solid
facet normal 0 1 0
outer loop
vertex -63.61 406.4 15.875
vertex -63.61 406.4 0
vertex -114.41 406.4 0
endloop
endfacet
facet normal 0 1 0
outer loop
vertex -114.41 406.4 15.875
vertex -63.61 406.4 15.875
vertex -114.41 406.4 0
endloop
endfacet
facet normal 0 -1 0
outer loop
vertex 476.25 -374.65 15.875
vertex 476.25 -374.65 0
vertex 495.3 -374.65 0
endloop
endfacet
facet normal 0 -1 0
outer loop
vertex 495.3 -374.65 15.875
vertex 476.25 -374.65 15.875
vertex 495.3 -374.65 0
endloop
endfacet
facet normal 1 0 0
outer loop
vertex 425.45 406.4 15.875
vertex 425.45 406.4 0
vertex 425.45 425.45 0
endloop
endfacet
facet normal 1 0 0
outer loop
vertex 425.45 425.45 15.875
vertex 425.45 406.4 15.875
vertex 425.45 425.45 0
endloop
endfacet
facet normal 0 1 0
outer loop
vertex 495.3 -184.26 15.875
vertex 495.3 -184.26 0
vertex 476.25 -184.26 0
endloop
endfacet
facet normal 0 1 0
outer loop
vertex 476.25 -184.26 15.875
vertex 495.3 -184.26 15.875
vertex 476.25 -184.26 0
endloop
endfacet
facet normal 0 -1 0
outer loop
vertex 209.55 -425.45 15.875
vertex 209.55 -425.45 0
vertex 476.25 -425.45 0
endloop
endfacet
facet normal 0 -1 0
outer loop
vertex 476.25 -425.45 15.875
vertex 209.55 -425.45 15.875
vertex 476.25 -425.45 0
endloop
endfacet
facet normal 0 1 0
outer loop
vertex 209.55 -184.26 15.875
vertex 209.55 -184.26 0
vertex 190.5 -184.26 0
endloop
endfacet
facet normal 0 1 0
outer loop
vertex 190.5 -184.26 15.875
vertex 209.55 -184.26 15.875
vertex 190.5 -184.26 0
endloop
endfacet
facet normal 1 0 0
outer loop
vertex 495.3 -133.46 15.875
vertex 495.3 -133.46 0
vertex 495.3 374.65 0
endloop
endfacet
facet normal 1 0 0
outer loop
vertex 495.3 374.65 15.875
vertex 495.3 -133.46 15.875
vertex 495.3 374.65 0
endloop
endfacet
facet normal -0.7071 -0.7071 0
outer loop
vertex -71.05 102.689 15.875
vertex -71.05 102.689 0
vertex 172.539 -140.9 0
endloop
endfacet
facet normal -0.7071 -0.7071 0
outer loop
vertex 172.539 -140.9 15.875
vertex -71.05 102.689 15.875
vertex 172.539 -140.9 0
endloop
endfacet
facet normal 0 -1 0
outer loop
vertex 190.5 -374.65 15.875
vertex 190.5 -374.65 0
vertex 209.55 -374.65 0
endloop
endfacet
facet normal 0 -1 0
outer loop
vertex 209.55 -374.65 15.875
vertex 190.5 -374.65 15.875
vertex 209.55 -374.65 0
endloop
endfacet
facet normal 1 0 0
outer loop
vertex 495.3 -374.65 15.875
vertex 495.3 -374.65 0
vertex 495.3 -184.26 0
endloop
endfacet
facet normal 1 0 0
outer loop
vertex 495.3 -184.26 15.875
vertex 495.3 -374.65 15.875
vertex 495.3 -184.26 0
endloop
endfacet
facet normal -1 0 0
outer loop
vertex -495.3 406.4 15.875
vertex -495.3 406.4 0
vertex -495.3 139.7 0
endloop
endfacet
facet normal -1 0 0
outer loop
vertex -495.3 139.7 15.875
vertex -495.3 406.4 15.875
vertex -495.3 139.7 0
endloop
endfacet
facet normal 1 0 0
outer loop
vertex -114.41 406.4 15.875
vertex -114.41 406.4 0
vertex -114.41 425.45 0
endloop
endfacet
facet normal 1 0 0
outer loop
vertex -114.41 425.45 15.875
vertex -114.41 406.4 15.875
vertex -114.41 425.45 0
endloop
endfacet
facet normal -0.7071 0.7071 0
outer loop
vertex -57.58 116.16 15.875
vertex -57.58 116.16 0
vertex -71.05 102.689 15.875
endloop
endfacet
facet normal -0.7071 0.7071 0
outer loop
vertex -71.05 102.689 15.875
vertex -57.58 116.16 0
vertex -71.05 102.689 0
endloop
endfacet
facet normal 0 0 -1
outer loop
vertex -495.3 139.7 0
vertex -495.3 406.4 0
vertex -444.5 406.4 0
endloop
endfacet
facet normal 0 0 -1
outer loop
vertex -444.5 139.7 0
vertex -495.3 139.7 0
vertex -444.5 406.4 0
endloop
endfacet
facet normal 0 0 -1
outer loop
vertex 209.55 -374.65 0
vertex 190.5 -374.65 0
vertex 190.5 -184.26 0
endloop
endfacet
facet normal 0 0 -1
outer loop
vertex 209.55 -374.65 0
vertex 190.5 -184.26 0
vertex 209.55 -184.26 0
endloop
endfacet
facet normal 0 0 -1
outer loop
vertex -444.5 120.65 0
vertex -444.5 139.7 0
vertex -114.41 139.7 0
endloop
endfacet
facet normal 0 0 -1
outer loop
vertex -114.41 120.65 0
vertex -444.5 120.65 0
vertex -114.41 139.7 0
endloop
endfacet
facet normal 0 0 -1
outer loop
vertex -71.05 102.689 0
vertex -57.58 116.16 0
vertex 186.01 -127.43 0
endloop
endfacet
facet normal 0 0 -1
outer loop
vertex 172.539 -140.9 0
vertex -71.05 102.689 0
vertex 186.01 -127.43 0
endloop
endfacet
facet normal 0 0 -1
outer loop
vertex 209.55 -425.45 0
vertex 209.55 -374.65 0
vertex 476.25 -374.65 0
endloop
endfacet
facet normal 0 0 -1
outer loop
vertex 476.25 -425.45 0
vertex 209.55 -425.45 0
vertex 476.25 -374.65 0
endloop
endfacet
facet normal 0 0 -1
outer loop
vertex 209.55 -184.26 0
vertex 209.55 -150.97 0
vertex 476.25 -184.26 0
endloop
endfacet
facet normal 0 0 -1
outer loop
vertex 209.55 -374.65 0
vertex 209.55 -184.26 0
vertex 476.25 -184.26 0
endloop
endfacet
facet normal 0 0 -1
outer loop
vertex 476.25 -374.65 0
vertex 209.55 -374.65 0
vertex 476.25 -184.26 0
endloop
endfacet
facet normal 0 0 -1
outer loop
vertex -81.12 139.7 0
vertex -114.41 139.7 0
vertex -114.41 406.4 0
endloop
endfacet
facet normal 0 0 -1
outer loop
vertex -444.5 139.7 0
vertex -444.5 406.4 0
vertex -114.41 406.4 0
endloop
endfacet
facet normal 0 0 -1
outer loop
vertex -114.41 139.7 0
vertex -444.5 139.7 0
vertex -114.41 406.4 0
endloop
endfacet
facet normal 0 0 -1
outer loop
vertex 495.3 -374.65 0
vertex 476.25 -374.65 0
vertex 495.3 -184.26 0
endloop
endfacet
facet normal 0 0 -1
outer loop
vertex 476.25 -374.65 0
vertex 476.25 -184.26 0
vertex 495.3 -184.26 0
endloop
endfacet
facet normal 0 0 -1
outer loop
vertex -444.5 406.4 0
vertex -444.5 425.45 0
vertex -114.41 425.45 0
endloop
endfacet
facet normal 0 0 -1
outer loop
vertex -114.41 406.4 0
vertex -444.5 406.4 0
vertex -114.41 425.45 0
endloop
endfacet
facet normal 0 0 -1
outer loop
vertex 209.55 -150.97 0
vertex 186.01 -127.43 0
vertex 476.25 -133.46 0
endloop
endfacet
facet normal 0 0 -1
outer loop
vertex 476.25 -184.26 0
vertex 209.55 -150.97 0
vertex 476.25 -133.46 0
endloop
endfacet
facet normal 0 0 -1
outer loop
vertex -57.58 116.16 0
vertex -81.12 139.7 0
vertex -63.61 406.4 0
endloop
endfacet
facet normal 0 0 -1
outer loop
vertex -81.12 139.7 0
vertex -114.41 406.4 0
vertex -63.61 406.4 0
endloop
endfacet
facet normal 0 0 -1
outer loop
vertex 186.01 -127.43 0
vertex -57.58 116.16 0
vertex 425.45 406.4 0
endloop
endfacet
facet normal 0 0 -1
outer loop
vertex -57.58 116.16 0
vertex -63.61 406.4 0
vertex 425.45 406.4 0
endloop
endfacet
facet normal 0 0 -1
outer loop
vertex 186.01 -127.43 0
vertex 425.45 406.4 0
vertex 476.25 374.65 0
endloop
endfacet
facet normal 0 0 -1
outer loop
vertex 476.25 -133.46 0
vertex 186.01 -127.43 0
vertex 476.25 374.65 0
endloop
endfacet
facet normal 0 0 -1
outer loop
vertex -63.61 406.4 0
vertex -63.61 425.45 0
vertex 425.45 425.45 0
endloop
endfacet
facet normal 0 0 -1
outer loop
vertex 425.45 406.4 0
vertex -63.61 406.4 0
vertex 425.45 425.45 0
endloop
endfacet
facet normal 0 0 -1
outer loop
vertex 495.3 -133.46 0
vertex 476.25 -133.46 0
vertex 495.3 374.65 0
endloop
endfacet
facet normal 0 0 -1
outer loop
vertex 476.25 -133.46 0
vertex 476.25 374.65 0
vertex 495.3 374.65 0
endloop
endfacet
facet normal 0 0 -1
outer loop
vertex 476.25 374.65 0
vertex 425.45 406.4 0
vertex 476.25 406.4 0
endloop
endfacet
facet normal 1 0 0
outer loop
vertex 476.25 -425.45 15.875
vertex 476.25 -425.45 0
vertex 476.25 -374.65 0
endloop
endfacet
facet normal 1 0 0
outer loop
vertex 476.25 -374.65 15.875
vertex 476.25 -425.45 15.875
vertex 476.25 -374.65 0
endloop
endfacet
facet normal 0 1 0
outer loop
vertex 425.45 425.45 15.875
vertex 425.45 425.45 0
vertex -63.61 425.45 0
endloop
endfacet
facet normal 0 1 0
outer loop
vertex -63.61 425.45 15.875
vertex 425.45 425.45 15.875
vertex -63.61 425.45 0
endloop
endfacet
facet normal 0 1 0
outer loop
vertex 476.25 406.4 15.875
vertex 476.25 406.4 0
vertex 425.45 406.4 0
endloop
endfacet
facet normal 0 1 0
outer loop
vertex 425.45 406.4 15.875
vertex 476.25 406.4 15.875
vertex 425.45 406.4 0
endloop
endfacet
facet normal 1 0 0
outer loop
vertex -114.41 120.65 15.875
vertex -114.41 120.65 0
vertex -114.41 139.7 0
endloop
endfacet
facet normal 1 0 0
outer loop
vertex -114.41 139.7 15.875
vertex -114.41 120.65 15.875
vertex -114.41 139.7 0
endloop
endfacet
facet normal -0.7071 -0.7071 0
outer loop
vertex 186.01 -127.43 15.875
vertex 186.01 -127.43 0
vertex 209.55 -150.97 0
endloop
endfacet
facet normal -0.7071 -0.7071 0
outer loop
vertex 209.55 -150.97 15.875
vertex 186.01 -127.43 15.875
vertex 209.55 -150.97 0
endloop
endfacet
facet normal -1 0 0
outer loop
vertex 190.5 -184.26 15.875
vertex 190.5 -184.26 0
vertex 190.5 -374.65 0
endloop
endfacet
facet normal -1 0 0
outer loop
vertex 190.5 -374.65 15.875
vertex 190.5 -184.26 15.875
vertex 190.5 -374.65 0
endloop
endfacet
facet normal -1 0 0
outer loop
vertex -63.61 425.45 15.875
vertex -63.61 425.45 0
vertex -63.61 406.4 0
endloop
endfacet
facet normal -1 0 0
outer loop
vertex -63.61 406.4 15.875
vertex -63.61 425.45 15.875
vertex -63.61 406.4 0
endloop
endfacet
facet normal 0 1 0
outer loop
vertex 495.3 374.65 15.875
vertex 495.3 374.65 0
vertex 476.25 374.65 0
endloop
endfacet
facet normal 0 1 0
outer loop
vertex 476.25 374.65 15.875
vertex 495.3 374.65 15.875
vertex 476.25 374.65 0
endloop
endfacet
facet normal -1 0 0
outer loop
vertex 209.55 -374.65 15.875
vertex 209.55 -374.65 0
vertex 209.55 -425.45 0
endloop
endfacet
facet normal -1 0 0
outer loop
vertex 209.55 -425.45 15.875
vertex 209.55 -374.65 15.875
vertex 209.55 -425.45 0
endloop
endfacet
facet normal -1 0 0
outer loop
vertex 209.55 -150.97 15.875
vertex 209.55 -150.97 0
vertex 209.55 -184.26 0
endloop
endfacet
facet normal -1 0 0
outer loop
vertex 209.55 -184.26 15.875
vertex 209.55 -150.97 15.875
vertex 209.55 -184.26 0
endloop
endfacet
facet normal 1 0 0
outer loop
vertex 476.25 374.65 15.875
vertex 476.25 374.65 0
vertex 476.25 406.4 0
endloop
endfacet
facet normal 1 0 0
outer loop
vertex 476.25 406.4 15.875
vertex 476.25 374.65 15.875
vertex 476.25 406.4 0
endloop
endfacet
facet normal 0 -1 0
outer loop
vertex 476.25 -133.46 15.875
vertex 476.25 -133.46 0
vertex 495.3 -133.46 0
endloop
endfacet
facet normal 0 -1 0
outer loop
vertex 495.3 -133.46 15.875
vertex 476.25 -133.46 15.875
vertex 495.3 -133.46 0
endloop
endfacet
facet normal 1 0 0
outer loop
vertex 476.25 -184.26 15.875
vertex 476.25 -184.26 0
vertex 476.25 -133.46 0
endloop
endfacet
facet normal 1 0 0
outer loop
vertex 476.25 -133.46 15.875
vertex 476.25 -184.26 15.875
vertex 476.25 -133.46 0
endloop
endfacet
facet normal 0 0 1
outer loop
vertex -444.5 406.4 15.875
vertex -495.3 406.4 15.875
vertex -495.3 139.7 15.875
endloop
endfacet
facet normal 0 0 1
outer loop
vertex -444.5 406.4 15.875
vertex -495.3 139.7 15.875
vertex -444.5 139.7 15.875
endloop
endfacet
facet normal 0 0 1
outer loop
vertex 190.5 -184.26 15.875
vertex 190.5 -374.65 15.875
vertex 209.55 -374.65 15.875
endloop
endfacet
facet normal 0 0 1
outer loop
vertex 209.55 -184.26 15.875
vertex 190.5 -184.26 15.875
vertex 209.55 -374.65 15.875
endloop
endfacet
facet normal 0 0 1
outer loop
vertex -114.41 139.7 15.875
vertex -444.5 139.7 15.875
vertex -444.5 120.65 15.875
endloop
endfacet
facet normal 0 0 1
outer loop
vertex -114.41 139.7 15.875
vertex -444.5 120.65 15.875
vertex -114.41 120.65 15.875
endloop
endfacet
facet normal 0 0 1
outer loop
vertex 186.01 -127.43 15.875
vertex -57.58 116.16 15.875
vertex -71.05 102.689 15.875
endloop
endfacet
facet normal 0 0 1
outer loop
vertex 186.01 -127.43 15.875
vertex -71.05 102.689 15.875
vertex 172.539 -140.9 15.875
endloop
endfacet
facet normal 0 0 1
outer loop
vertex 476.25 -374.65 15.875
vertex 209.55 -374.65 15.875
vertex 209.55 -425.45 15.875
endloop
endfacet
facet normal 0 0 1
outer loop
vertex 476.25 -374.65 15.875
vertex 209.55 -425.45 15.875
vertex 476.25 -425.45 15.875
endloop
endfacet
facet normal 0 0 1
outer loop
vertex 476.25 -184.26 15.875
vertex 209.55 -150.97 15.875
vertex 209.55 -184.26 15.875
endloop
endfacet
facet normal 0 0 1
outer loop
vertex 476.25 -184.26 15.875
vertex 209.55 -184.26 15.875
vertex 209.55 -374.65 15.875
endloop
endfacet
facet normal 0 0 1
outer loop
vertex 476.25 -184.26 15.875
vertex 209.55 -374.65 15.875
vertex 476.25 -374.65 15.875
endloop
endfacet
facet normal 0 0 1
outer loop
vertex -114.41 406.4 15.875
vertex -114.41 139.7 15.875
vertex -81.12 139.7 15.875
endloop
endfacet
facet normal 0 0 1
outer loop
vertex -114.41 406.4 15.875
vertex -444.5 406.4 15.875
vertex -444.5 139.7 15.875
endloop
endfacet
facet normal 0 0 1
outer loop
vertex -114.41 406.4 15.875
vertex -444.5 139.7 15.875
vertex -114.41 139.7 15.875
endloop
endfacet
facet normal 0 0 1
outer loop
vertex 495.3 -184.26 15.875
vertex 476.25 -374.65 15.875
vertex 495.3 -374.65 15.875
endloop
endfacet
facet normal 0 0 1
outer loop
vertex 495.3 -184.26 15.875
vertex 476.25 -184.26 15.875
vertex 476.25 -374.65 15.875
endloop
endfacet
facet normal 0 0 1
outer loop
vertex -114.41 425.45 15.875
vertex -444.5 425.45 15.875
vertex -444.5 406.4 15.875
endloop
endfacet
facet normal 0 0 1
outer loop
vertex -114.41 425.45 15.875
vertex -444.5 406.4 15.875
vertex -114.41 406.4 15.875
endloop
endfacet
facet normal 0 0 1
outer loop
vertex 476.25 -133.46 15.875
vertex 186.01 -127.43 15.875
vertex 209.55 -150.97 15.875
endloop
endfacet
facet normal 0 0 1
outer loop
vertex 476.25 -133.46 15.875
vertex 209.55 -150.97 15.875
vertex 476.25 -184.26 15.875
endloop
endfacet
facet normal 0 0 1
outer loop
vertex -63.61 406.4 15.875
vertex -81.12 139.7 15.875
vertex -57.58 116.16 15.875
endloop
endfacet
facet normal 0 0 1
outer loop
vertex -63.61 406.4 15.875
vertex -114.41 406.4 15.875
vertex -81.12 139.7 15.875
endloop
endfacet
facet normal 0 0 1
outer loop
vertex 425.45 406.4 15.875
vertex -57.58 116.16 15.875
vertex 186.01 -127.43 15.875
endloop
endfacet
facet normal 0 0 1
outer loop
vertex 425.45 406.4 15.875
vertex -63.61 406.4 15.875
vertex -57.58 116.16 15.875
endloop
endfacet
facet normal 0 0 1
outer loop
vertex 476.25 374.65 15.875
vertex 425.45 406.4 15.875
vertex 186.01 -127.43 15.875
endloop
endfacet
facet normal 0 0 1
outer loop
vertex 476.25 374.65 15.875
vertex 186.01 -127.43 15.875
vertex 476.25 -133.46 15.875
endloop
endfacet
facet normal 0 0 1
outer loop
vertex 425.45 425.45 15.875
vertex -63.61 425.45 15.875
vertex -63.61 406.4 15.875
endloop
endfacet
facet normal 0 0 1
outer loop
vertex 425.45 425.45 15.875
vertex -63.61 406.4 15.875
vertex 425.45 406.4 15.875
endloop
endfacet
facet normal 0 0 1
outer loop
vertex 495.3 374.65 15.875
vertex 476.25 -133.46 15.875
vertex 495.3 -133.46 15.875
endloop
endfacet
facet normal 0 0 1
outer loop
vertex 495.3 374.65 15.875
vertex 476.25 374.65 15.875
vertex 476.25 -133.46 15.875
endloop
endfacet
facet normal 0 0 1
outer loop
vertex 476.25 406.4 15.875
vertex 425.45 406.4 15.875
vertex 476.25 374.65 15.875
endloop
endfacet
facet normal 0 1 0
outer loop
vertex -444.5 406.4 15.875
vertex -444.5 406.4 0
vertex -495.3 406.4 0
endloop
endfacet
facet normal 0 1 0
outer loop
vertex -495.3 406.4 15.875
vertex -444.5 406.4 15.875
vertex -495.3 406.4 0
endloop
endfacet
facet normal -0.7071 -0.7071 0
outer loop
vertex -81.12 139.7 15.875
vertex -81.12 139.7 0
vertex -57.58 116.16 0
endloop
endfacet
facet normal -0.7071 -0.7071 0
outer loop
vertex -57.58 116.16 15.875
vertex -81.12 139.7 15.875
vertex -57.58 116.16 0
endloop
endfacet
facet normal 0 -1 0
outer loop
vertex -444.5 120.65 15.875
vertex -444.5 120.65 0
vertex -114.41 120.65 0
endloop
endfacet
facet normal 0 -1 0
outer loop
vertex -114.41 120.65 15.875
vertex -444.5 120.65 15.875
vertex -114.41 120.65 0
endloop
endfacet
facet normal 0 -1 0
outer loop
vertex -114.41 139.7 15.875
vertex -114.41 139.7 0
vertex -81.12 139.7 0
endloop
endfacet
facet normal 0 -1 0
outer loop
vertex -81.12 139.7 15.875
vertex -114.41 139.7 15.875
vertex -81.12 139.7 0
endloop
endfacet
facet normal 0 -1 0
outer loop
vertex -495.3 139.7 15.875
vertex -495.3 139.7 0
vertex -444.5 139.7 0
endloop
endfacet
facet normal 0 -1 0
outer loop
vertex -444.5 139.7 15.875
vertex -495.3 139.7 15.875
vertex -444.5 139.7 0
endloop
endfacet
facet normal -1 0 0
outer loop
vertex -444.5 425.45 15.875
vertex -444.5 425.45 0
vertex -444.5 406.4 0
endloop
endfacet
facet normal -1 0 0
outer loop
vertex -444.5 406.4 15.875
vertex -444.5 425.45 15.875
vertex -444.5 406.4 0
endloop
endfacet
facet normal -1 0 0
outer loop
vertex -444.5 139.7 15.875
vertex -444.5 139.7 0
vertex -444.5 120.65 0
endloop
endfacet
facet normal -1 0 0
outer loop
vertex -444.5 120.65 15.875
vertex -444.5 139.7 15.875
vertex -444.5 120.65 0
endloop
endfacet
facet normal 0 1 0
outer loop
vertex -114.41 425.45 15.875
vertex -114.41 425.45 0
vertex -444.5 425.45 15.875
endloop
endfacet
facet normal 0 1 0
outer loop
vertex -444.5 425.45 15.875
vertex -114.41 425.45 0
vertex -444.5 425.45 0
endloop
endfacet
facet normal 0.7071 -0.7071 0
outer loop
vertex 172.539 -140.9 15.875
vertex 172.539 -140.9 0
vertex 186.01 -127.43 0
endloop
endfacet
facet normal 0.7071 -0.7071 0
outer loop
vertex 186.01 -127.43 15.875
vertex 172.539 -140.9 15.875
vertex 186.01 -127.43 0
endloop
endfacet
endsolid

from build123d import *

# Parameters (mm, degrees)
F1_DEPTH = 15.875


with BuildPart() as f1:
    # F0 (on Top) → F1 (new body)
    with BuildSketch(Plane.XY):
        Polygon((209.55, -374.65), (209.55, -425.45), (476.25, -425.45), (476.25, -374.65), (495.3, -374.65), (495.3, -184.260472), (476.25, -184.260472), (476.25, -133.460472), (495.3, -133.460472), (495.3, 374.65), (476.25, 374.65), (476.25, 406.4), (425.45, 406.4), (425.45, 425.45), (-63.610472, 425.45), (-63.610472, 406.4), (-114.410472, 406.4), (-114.410472, 425.45), (-444.5, 425.45), (-444.5, 406.4), (-495.3, 406.4), (-495.3, 139.7), (-444.5, 139.7), (-444.5, 120.65), (-114.410472, 120.65), (-114.410472, 139.7), (-81.119703, 139.7), (-57.579575, 116.159872), (-71.04996, 102.689488), (172.539488, -140.89996), (186.009872, -127.429575), (209.55, -150.969703), (209.55, -184.260472), (190.5, -184.260472), (190.5, -374.65), align=None)
    extrude(amount=F1_DEPTH)


solid = f1.part
